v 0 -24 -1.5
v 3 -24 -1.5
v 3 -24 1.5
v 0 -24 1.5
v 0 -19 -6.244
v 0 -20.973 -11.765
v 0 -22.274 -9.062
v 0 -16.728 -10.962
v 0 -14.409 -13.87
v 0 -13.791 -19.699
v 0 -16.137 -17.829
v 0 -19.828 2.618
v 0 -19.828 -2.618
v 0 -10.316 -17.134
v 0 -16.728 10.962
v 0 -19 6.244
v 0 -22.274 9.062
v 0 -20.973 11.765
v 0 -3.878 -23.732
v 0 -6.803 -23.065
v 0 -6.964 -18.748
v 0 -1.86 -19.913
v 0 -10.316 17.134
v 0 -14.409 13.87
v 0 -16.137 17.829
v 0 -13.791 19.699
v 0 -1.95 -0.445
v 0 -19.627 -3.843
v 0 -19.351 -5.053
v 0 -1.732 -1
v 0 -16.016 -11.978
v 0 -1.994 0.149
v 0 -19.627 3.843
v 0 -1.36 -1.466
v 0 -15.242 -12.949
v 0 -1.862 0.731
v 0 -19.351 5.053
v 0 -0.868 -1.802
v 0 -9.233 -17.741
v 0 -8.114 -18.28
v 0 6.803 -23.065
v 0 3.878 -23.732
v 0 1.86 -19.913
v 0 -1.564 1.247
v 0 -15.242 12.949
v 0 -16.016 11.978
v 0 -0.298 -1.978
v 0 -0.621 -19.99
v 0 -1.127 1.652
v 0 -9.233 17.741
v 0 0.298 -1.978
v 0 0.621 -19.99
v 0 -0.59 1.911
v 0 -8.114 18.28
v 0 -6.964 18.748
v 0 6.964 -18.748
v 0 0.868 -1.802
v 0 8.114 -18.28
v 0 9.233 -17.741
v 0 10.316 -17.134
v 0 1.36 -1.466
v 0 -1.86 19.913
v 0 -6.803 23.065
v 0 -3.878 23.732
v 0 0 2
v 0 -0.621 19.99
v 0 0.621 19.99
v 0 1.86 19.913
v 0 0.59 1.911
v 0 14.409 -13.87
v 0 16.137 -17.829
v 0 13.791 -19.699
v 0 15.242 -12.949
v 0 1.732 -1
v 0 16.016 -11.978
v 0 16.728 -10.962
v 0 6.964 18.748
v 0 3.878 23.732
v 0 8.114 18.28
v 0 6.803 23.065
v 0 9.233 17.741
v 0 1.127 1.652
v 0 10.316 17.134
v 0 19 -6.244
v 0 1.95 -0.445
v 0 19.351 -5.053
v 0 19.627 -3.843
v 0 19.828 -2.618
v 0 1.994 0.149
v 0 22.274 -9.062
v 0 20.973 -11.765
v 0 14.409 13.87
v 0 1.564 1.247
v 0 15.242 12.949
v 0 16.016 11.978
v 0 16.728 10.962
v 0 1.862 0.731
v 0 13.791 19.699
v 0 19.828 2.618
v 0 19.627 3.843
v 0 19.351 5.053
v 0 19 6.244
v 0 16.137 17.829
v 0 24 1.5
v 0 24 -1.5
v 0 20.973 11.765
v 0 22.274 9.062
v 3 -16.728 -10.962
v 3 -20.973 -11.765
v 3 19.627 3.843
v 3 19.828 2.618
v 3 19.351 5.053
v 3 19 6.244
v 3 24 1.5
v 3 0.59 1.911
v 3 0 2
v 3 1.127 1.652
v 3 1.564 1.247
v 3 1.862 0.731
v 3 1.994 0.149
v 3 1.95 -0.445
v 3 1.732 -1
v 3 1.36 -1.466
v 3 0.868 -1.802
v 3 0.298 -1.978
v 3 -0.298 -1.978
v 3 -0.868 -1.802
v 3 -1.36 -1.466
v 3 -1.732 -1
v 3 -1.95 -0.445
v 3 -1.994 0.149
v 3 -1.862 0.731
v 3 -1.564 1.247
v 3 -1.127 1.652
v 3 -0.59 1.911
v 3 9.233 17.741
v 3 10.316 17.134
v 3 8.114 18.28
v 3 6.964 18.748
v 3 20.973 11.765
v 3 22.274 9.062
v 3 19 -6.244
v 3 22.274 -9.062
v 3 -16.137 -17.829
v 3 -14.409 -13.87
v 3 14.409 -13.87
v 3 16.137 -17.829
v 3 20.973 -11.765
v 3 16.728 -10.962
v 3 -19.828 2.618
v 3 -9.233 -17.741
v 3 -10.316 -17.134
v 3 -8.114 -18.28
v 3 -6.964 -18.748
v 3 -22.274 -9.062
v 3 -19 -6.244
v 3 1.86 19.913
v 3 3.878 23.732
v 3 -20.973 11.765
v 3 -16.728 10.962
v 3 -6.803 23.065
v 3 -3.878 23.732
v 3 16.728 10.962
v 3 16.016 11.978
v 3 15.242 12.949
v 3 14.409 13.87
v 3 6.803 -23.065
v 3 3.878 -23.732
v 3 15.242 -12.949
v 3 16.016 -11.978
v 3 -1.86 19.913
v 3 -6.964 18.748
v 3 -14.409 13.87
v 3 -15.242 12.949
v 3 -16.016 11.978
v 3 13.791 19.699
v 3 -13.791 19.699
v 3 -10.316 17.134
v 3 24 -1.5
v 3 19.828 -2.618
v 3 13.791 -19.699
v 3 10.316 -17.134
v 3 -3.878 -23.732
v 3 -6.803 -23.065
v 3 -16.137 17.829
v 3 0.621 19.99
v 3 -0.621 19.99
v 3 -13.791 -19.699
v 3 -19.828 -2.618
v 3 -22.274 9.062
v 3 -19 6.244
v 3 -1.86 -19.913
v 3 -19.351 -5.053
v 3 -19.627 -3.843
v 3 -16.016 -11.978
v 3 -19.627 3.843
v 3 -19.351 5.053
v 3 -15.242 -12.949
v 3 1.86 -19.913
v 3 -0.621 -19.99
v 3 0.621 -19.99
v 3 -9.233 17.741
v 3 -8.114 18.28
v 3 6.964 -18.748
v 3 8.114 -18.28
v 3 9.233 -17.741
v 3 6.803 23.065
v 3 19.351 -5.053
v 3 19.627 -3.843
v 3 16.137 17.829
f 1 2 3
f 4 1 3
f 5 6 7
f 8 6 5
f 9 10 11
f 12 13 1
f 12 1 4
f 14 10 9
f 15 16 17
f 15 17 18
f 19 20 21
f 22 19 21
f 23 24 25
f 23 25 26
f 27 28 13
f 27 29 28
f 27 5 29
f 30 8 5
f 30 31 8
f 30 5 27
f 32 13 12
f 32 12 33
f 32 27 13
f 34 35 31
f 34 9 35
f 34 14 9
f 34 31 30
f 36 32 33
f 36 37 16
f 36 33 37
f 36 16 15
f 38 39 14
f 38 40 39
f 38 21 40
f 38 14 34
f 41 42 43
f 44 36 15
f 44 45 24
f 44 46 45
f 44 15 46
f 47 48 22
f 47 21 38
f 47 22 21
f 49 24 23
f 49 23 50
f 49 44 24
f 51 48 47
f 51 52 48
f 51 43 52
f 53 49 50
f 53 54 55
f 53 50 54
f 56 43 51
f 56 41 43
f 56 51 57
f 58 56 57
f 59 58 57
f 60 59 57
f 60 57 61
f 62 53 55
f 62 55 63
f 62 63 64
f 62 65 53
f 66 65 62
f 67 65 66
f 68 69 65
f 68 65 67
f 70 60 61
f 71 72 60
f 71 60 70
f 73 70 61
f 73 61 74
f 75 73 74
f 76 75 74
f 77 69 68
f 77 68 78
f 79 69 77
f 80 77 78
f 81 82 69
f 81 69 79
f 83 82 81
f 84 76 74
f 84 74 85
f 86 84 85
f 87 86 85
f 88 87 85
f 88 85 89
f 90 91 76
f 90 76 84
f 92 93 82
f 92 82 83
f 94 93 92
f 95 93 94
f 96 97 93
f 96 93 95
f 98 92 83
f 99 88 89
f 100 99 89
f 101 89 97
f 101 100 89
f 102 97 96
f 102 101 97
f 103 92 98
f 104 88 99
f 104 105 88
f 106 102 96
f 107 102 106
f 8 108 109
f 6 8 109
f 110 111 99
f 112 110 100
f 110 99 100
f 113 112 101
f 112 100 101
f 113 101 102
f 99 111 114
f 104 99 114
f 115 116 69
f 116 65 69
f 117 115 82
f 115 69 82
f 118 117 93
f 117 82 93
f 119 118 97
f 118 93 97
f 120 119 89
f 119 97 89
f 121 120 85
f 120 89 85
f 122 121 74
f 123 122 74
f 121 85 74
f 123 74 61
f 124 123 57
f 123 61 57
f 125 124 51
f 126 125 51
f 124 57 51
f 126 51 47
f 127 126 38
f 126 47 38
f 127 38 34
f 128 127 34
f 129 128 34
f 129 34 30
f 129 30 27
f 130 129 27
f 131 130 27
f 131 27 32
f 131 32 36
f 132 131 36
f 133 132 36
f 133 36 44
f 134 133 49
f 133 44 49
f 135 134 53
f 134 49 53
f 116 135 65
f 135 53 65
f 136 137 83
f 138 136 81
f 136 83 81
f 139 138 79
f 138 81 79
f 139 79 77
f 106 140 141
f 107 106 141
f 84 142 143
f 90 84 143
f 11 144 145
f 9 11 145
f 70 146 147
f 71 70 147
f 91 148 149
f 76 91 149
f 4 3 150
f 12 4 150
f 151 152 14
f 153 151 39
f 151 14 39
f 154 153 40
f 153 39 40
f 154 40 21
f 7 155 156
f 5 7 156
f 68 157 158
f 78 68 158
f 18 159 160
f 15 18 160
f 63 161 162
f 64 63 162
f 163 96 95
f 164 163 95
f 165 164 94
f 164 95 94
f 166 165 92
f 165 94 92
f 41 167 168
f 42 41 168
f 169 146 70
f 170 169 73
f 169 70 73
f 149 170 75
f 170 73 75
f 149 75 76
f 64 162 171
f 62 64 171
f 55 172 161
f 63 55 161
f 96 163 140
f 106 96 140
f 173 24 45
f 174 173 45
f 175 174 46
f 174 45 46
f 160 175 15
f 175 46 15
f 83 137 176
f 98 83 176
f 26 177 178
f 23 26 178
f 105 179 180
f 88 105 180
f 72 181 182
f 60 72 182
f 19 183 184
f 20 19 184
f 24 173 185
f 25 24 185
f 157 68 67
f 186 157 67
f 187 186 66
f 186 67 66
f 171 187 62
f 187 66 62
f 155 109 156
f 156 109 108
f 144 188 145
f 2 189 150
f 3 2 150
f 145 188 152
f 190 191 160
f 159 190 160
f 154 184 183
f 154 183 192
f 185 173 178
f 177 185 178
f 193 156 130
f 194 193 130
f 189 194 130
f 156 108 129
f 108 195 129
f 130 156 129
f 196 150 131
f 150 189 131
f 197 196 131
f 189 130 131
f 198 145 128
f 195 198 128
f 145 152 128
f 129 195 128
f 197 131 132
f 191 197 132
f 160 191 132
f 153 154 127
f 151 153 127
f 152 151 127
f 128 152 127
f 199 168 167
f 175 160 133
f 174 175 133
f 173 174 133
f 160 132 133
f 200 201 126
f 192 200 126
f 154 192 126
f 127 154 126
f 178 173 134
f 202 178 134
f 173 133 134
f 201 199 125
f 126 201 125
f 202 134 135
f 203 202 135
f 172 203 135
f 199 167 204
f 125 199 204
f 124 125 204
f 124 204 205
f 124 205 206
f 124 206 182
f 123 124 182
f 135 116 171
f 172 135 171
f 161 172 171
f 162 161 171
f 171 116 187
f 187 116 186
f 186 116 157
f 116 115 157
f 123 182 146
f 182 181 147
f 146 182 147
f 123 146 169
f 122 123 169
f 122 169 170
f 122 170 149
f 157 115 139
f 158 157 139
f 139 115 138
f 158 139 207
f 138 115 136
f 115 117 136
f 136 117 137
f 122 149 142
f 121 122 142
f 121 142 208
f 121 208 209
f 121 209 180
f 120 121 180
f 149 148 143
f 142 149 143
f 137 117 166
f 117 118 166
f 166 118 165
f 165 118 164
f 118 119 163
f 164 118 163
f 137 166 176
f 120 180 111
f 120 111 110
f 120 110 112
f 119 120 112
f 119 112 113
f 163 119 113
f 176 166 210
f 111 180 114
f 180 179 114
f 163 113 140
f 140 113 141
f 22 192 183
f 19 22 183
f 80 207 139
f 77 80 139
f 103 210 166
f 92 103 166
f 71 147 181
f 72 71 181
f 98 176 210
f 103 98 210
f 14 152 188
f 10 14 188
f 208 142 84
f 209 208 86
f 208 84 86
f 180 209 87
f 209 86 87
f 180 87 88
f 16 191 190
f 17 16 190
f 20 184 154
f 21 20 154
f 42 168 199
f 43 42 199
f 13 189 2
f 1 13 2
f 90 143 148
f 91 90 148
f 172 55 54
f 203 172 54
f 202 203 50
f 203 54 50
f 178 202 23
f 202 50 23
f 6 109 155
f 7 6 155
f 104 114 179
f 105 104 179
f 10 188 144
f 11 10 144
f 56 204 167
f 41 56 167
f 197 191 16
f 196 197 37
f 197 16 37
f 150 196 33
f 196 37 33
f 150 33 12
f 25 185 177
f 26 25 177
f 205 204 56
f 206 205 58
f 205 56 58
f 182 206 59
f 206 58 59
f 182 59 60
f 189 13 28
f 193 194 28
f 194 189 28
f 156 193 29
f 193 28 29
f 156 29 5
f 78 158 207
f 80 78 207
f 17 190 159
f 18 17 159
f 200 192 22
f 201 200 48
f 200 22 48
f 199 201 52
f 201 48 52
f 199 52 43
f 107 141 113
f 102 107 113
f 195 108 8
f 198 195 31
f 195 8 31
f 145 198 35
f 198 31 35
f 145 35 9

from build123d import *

# Parameters (mm, degrees)
SKETCH3_R                 = 20
BOSS_EXTRUDE2_DEPTH       = 3
BOSS_EXTRUDE3_DEPTH       = 3
CIRPATTERN1_COUNT         = 14
F_4_0MM_DOWEL_HOLE1_D     = 4
F_4_0MM_DOWEL_HOLE1_DEPTH = 3
F_4_0MM_DOWEL_HOLE1_TIP   = 1.201721238


with BuildPart() as part:
    # Sketch3 → Boss-Extrude2 (new body)
    with BuildSketch(Plane(origin=(0, 0, 0), x_dir=(0, 0, -1), z_dir=(1, 0, 0))):
        Circle(SKETCH3_R)
    extrude(amount=BOSS_EXTRUDE2_DEPTH)

    # Sketch4 → Boss-Extrude3 (add)
    with BuildSketch(Plane(origin=(3, 0, 0), x_dir=(0, 0, -1), z_dir=(1, 0, 0))):
        Polygon((1.5, 24.000314342), (2.617991667, 19.827912639), (-2.617991667, 19.827912639), (-1.5, 24.000314342), align=None)
    boss_extrude3 = extrude(amount=-BOSS_EXTRUDE3_DEPTH)

    # CirPattern1: Boss-Extrude3 ×14 about axis
    cirpattern1_axis = Axis((0, 0, 0), (1, 0, 0))
    for i in range(1, CIRPATTERN1_COUNT):
        add(boss_extrude3.rotate(cirpattern1_axis, i * 360 / CIRPATTERN1_COUNT))

    # Ø4.0mm Dowel Hole1
    with Locations(Plane(origin=(3, 0, 0), x_dir=(0, 0, -1), z_dir=(1, 0, 0))):
        with Locations((0, 0)):
            Hole(F_4_0MM_DOWEL_HOLE1_D / 2, depth=F_4_0MM_DOWEL_HOLE1_DEPTH)
            with Locations((0, 0, -(F_4_0MM_DOWEL_HOLE1_DEPTH + F_4_0MM_DOWEL_HOLE1_TIP / 2))):  # 118° drill point
                Cone(0, F_4_0MM_DOWEL_HOLE1_D / 2, F_4_0MM_DOWEL_HOLE1_TIP, mode=Mode.SUBTRACT)


solid = part.part
